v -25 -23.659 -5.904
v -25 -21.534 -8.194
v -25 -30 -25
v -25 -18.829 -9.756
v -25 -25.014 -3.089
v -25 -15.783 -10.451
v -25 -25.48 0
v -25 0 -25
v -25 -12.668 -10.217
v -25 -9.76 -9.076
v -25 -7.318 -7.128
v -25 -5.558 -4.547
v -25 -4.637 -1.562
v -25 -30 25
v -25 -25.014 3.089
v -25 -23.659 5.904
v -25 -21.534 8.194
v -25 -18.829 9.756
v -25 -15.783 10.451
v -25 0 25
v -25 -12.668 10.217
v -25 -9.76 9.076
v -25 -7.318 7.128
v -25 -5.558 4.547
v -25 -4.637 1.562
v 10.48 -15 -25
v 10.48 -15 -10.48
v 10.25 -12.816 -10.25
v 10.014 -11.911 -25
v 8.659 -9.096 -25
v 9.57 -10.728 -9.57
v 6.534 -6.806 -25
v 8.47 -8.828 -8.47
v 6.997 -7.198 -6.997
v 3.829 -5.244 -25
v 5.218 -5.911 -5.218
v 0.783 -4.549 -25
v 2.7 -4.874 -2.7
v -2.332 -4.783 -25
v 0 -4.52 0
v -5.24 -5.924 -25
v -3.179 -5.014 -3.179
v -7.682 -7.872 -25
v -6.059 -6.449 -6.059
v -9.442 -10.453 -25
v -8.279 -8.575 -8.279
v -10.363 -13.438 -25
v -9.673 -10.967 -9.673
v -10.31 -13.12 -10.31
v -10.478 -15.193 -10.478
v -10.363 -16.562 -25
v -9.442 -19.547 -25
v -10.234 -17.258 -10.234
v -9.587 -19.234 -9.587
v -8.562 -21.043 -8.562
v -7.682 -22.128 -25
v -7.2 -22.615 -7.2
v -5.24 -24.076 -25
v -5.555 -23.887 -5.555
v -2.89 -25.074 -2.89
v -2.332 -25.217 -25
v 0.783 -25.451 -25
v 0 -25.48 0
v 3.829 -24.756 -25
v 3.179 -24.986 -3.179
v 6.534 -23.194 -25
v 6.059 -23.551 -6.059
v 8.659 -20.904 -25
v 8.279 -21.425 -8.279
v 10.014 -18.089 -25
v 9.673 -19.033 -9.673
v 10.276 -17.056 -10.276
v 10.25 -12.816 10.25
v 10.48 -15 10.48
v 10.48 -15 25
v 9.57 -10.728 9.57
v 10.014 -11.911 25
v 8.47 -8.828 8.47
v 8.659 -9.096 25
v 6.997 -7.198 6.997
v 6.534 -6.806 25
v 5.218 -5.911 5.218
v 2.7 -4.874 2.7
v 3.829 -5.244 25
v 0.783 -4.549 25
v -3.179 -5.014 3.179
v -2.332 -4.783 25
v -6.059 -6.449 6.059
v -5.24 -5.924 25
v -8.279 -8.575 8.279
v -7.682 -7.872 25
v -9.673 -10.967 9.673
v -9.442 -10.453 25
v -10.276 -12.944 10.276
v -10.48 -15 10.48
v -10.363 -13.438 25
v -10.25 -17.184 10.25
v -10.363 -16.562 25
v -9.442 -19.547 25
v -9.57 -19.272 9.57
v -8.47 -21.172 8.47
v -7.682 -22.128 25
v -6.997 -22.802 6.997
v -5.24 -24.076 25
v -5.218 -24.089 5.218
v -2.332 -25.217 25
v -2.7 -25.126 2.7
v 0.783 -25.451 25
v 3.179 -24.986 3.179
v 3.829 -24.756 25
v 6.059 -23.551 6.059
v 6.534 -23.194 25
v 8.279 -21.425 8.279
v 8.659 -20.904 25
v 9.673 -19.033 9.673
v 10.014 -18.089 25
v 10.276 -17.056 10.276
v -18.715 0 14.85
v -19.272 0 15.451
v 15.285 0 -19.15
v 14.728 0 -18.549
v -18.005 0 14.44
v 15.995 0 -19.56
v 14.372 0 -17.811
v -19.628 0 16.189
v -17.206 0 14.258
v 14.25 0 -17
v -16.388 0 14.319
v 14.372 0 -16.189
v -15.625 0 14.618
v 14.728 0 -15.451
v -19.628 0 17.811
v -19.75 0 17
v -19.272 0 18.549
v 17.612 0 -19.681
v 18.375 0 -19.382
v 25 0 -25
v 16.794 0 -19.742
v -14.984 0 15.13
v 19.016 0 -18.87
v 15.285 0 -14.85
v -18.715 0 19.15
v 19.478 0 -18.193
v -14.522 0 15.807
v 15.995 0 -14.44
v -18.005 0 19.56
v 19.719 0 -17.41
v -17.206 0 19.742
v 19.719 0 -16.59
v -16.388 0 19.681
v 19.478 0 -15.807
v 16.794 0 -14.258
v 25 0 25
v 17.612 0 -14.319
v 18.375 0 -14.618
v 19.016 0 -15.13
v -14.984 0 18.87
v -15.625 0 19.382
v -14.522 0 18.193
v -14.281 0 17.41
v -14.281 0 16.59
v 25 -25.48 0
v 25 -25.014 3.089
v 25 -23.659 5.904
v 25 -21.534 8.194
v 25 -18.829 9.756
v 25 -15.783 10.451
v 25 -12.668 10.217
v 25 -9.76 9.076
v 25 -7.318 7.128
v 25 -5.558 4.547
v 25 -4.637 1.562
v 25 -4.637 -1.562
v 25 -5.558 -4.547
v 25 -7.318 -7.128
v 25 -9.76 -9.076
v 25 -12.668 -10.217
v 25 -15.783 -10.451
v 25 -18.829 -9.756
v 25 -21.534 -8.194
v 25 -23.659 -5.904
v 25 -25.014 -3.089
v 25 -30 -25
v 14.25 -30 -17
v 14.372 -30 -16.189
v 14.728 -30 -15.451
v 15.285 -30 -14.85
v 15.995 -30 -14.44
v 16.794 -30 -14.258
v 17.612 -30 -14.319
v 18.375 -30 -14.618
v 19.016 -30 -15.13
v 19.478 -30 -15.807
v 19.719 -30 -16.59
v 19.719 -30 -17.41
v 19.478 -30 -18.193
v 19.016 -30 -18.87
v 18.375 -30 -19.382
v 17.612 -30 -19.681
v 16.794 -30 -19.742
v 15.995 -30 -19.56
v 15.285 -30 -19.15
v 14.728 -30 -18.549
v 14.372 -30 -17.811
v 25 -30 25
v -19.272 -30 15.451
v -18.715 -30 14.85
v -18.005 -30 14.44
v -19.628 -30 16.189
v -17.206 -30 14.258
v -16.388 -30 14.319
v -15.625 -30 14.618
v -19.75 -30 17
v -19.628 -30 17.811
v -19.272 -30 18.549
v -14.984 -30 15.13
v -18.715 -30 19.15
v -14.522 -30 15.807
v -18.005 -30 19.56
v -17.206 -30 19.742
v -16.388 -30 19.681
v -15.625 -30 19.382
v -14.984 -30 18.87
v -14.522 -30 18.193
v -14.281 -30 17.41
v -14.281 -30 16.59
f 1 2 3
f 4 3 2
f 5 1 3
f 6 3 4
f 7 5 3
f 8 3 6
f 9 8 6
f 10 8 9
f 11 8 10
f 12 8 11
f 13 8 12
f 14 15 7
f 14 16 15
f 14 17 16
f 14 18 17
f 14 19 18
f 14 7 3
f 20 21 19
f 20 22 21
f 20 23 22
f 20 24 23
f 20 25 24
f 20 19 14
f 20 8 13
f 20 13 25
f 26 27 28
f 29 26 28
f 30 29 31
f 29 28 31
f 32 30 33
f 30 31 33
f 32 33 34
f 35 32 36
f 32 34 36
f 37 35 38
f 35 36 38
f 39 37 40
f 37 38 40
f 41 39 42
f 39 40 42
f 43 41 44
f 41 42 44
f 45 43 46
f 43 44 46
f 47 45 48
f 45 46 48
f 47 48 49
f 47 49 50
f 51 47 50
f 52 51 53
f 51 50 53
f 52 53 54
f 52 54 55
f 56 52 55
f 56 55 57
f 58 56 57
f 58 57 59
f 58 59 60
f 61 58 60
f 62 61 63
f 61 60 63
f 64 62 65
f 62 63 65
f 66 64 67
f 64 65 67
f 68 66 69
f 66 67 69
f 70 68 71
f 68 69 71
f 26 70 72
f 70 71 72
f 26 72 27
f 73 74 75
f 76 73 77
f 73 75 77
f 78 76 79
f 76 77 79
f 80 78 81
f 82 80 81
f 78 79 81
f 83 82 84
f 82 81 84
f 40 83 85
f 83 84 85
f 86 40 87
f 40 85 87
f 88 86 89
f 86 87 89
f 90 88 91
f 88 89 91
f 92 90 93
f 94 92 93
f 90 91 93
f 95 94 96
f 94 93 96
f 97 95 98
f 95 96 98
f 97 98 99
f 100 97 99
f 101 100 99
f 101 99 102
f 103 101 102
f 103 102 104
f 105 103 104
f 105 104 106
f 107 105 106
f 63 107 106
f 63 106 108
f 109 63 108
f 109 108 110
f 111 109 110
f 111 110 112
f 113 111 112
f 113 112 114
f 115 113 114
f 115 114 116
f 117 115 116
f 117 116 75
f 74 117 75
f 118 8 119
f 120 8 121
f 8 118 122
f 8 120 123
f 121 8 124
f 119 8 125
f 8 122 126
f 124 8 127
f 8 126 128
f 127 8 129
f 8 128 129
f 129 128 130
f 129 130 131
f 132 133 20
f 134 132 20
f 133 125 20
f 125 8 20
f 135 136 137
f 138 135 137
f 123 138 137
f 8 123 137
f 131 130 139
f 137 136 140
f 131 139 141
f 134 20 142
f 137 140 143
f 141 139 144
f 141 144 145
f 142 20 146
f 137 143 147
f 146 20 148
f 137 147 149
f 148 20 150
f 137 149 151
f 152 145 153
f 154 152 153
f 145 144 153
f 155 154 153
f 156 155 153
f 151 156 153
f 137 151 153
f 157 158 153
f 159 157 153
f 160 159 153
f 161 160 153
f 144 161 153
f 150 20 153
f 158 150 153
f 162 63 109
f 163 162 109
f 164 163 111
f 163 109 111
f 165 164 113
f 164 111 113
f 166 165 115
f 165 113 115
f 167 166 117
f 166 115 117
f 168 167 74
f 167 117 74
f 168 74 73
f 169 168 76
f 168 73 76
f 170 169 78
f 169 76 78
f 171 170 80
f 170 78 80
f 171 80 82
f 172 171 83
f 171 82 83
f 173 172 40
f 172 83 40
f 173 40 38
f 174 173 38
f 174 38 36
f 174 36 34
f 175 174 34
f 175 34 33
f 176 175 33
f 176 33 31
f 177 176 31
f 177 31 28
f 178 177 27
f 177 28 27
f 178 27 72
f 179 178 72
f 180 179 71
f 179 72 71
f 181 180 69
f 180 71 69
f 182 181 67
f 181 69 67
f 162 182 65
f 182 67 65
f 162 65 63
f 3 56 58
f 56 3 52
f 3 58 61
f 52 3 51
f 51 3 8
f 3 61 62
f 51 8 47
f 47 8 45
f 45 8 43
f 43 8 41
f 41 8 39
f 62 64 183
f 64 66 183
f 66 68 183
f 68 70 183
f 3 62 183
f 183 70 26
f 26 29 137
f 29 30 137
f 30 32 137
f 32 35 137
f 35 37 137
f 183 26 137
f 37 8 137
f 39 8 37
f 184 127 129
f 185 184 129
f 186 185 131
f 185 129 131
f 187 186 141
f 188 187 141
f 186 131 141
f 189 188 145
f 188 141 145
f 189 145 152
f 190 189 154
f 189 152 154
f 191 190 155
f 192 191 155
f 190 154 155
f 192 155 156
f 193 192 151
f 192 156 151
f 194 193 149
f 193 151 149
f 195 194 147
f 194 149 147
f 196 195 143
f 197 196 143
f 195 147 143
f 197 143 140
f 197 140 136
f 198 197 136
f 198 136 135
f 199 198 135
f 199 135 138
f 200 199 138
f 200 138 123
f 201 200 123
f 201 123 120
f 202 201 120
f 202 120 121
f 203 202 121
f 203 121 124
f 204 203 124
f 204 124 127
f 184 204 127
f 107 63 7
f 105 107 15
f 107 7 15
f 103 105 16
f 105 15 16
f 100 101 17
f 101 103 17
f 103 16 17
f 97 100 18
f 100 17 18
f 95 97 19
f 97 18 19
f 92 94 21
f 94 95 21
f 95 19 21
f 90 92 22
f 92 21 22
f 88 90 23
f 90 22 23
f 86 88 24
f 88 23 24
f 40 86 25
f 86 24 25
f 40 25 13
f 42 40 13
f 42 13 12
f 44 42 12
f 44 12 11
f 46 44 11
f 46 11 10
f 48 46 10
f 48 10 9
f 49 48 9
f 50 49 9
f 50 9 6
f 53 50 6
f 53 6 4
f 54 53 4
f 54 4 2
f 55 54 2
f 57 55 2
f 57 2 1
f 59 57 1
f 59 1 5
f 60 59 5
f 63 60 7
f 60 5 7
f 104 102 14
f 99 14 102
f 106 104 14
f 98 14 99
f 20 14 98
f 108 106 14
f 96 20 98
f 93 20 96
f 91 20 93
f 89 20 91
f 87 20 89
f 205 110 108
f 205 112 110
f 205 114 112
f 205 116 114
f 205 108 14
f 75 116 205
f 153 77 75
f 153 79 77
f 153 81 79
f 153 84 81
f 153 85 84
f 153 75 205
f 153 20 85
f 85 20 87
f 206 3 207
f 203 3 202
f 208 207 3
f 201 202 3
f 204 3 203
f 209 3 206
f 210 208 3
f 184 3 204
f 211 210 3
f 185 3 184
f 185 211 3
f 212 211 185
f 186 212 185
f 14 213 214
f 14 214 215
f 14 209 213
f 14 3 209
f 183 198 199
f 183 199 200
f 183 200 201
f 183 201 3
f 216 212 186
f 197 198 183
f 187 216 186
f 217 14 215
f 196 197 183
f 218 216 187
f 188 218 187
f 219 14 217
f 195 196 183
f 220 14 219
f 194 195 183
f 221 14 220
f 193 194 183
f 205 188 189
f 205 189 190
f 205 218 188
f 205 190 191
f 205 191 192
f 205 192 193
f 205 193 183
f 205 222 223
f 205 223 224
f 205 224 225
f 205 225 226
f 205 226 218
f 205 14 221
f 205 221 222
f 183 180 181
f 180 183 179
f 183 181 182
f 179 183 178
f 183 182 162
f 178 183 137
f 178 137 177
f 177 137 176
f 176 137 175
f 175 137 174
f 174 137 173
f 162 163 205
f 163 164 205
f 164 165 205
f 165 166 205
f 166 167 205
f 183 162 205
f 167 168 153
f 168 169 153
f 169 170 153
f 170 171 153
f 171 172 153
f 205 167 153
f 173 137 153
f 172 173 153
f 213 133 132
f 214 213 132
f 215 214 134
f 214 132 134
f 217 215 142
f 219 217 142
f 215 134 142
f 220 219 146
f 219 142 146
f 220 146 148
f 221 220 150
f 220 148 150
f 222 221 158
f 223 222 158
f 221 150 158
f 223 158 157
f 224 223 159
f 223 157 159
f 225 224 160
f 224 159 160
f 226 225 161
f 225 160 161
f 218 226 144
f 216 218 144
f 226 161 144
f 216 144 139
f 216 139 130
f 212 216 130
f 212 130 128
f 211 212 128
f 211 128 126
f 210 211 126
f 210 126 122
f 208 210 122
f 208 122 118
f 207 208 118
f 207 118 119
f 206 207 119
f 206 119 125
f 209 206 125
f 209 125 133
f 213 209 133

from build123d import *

# Parameters (mm, degrees)
F0_W     = 50
F0_H     = 50
F1_DEPTH = 30
F3_D     = 5.5
F4_R     = 10.48
F5_DEPTH = 50.001
F6_R     = 10.48
F7_DEPTH = 50.001


with BuildPart() as f1:
    # F0 (on Front) → F1 (new body)
    with BuildSketch(Plane.XZ):
        Rectangle(F0_W, F0_H)
    extrude(amount=F1_DEPTH)

    # F3 (through all)
    with Locations(Plane.XZ.offset(30)):
        with Locations((-17, 17), (17, -17)):
            Hole(F3_D / 2)

    # F4 (on face) → F5 (cut, through all)
    with BuildSketch(Plane.XY.offset(25)):
        with Locations((0, -15)):
            Circle(F4_R)
    extrude(amount=-F5_DEPTH, mode=Mode.SUBTRACT)

    # F6 (on face) → F7 (cut, through all)
    with BuildSketch(Plane(origin=(-25, 0, 0), x_dir=(0, -1, 0), z_dir=(-1, 0, 0))):
        with Locations((15, 0)):
            Circle(F6_R)
    extrude(amount=-F7_DEPTH, mode=Mode.SUBTRACT)


solid = f1.part
